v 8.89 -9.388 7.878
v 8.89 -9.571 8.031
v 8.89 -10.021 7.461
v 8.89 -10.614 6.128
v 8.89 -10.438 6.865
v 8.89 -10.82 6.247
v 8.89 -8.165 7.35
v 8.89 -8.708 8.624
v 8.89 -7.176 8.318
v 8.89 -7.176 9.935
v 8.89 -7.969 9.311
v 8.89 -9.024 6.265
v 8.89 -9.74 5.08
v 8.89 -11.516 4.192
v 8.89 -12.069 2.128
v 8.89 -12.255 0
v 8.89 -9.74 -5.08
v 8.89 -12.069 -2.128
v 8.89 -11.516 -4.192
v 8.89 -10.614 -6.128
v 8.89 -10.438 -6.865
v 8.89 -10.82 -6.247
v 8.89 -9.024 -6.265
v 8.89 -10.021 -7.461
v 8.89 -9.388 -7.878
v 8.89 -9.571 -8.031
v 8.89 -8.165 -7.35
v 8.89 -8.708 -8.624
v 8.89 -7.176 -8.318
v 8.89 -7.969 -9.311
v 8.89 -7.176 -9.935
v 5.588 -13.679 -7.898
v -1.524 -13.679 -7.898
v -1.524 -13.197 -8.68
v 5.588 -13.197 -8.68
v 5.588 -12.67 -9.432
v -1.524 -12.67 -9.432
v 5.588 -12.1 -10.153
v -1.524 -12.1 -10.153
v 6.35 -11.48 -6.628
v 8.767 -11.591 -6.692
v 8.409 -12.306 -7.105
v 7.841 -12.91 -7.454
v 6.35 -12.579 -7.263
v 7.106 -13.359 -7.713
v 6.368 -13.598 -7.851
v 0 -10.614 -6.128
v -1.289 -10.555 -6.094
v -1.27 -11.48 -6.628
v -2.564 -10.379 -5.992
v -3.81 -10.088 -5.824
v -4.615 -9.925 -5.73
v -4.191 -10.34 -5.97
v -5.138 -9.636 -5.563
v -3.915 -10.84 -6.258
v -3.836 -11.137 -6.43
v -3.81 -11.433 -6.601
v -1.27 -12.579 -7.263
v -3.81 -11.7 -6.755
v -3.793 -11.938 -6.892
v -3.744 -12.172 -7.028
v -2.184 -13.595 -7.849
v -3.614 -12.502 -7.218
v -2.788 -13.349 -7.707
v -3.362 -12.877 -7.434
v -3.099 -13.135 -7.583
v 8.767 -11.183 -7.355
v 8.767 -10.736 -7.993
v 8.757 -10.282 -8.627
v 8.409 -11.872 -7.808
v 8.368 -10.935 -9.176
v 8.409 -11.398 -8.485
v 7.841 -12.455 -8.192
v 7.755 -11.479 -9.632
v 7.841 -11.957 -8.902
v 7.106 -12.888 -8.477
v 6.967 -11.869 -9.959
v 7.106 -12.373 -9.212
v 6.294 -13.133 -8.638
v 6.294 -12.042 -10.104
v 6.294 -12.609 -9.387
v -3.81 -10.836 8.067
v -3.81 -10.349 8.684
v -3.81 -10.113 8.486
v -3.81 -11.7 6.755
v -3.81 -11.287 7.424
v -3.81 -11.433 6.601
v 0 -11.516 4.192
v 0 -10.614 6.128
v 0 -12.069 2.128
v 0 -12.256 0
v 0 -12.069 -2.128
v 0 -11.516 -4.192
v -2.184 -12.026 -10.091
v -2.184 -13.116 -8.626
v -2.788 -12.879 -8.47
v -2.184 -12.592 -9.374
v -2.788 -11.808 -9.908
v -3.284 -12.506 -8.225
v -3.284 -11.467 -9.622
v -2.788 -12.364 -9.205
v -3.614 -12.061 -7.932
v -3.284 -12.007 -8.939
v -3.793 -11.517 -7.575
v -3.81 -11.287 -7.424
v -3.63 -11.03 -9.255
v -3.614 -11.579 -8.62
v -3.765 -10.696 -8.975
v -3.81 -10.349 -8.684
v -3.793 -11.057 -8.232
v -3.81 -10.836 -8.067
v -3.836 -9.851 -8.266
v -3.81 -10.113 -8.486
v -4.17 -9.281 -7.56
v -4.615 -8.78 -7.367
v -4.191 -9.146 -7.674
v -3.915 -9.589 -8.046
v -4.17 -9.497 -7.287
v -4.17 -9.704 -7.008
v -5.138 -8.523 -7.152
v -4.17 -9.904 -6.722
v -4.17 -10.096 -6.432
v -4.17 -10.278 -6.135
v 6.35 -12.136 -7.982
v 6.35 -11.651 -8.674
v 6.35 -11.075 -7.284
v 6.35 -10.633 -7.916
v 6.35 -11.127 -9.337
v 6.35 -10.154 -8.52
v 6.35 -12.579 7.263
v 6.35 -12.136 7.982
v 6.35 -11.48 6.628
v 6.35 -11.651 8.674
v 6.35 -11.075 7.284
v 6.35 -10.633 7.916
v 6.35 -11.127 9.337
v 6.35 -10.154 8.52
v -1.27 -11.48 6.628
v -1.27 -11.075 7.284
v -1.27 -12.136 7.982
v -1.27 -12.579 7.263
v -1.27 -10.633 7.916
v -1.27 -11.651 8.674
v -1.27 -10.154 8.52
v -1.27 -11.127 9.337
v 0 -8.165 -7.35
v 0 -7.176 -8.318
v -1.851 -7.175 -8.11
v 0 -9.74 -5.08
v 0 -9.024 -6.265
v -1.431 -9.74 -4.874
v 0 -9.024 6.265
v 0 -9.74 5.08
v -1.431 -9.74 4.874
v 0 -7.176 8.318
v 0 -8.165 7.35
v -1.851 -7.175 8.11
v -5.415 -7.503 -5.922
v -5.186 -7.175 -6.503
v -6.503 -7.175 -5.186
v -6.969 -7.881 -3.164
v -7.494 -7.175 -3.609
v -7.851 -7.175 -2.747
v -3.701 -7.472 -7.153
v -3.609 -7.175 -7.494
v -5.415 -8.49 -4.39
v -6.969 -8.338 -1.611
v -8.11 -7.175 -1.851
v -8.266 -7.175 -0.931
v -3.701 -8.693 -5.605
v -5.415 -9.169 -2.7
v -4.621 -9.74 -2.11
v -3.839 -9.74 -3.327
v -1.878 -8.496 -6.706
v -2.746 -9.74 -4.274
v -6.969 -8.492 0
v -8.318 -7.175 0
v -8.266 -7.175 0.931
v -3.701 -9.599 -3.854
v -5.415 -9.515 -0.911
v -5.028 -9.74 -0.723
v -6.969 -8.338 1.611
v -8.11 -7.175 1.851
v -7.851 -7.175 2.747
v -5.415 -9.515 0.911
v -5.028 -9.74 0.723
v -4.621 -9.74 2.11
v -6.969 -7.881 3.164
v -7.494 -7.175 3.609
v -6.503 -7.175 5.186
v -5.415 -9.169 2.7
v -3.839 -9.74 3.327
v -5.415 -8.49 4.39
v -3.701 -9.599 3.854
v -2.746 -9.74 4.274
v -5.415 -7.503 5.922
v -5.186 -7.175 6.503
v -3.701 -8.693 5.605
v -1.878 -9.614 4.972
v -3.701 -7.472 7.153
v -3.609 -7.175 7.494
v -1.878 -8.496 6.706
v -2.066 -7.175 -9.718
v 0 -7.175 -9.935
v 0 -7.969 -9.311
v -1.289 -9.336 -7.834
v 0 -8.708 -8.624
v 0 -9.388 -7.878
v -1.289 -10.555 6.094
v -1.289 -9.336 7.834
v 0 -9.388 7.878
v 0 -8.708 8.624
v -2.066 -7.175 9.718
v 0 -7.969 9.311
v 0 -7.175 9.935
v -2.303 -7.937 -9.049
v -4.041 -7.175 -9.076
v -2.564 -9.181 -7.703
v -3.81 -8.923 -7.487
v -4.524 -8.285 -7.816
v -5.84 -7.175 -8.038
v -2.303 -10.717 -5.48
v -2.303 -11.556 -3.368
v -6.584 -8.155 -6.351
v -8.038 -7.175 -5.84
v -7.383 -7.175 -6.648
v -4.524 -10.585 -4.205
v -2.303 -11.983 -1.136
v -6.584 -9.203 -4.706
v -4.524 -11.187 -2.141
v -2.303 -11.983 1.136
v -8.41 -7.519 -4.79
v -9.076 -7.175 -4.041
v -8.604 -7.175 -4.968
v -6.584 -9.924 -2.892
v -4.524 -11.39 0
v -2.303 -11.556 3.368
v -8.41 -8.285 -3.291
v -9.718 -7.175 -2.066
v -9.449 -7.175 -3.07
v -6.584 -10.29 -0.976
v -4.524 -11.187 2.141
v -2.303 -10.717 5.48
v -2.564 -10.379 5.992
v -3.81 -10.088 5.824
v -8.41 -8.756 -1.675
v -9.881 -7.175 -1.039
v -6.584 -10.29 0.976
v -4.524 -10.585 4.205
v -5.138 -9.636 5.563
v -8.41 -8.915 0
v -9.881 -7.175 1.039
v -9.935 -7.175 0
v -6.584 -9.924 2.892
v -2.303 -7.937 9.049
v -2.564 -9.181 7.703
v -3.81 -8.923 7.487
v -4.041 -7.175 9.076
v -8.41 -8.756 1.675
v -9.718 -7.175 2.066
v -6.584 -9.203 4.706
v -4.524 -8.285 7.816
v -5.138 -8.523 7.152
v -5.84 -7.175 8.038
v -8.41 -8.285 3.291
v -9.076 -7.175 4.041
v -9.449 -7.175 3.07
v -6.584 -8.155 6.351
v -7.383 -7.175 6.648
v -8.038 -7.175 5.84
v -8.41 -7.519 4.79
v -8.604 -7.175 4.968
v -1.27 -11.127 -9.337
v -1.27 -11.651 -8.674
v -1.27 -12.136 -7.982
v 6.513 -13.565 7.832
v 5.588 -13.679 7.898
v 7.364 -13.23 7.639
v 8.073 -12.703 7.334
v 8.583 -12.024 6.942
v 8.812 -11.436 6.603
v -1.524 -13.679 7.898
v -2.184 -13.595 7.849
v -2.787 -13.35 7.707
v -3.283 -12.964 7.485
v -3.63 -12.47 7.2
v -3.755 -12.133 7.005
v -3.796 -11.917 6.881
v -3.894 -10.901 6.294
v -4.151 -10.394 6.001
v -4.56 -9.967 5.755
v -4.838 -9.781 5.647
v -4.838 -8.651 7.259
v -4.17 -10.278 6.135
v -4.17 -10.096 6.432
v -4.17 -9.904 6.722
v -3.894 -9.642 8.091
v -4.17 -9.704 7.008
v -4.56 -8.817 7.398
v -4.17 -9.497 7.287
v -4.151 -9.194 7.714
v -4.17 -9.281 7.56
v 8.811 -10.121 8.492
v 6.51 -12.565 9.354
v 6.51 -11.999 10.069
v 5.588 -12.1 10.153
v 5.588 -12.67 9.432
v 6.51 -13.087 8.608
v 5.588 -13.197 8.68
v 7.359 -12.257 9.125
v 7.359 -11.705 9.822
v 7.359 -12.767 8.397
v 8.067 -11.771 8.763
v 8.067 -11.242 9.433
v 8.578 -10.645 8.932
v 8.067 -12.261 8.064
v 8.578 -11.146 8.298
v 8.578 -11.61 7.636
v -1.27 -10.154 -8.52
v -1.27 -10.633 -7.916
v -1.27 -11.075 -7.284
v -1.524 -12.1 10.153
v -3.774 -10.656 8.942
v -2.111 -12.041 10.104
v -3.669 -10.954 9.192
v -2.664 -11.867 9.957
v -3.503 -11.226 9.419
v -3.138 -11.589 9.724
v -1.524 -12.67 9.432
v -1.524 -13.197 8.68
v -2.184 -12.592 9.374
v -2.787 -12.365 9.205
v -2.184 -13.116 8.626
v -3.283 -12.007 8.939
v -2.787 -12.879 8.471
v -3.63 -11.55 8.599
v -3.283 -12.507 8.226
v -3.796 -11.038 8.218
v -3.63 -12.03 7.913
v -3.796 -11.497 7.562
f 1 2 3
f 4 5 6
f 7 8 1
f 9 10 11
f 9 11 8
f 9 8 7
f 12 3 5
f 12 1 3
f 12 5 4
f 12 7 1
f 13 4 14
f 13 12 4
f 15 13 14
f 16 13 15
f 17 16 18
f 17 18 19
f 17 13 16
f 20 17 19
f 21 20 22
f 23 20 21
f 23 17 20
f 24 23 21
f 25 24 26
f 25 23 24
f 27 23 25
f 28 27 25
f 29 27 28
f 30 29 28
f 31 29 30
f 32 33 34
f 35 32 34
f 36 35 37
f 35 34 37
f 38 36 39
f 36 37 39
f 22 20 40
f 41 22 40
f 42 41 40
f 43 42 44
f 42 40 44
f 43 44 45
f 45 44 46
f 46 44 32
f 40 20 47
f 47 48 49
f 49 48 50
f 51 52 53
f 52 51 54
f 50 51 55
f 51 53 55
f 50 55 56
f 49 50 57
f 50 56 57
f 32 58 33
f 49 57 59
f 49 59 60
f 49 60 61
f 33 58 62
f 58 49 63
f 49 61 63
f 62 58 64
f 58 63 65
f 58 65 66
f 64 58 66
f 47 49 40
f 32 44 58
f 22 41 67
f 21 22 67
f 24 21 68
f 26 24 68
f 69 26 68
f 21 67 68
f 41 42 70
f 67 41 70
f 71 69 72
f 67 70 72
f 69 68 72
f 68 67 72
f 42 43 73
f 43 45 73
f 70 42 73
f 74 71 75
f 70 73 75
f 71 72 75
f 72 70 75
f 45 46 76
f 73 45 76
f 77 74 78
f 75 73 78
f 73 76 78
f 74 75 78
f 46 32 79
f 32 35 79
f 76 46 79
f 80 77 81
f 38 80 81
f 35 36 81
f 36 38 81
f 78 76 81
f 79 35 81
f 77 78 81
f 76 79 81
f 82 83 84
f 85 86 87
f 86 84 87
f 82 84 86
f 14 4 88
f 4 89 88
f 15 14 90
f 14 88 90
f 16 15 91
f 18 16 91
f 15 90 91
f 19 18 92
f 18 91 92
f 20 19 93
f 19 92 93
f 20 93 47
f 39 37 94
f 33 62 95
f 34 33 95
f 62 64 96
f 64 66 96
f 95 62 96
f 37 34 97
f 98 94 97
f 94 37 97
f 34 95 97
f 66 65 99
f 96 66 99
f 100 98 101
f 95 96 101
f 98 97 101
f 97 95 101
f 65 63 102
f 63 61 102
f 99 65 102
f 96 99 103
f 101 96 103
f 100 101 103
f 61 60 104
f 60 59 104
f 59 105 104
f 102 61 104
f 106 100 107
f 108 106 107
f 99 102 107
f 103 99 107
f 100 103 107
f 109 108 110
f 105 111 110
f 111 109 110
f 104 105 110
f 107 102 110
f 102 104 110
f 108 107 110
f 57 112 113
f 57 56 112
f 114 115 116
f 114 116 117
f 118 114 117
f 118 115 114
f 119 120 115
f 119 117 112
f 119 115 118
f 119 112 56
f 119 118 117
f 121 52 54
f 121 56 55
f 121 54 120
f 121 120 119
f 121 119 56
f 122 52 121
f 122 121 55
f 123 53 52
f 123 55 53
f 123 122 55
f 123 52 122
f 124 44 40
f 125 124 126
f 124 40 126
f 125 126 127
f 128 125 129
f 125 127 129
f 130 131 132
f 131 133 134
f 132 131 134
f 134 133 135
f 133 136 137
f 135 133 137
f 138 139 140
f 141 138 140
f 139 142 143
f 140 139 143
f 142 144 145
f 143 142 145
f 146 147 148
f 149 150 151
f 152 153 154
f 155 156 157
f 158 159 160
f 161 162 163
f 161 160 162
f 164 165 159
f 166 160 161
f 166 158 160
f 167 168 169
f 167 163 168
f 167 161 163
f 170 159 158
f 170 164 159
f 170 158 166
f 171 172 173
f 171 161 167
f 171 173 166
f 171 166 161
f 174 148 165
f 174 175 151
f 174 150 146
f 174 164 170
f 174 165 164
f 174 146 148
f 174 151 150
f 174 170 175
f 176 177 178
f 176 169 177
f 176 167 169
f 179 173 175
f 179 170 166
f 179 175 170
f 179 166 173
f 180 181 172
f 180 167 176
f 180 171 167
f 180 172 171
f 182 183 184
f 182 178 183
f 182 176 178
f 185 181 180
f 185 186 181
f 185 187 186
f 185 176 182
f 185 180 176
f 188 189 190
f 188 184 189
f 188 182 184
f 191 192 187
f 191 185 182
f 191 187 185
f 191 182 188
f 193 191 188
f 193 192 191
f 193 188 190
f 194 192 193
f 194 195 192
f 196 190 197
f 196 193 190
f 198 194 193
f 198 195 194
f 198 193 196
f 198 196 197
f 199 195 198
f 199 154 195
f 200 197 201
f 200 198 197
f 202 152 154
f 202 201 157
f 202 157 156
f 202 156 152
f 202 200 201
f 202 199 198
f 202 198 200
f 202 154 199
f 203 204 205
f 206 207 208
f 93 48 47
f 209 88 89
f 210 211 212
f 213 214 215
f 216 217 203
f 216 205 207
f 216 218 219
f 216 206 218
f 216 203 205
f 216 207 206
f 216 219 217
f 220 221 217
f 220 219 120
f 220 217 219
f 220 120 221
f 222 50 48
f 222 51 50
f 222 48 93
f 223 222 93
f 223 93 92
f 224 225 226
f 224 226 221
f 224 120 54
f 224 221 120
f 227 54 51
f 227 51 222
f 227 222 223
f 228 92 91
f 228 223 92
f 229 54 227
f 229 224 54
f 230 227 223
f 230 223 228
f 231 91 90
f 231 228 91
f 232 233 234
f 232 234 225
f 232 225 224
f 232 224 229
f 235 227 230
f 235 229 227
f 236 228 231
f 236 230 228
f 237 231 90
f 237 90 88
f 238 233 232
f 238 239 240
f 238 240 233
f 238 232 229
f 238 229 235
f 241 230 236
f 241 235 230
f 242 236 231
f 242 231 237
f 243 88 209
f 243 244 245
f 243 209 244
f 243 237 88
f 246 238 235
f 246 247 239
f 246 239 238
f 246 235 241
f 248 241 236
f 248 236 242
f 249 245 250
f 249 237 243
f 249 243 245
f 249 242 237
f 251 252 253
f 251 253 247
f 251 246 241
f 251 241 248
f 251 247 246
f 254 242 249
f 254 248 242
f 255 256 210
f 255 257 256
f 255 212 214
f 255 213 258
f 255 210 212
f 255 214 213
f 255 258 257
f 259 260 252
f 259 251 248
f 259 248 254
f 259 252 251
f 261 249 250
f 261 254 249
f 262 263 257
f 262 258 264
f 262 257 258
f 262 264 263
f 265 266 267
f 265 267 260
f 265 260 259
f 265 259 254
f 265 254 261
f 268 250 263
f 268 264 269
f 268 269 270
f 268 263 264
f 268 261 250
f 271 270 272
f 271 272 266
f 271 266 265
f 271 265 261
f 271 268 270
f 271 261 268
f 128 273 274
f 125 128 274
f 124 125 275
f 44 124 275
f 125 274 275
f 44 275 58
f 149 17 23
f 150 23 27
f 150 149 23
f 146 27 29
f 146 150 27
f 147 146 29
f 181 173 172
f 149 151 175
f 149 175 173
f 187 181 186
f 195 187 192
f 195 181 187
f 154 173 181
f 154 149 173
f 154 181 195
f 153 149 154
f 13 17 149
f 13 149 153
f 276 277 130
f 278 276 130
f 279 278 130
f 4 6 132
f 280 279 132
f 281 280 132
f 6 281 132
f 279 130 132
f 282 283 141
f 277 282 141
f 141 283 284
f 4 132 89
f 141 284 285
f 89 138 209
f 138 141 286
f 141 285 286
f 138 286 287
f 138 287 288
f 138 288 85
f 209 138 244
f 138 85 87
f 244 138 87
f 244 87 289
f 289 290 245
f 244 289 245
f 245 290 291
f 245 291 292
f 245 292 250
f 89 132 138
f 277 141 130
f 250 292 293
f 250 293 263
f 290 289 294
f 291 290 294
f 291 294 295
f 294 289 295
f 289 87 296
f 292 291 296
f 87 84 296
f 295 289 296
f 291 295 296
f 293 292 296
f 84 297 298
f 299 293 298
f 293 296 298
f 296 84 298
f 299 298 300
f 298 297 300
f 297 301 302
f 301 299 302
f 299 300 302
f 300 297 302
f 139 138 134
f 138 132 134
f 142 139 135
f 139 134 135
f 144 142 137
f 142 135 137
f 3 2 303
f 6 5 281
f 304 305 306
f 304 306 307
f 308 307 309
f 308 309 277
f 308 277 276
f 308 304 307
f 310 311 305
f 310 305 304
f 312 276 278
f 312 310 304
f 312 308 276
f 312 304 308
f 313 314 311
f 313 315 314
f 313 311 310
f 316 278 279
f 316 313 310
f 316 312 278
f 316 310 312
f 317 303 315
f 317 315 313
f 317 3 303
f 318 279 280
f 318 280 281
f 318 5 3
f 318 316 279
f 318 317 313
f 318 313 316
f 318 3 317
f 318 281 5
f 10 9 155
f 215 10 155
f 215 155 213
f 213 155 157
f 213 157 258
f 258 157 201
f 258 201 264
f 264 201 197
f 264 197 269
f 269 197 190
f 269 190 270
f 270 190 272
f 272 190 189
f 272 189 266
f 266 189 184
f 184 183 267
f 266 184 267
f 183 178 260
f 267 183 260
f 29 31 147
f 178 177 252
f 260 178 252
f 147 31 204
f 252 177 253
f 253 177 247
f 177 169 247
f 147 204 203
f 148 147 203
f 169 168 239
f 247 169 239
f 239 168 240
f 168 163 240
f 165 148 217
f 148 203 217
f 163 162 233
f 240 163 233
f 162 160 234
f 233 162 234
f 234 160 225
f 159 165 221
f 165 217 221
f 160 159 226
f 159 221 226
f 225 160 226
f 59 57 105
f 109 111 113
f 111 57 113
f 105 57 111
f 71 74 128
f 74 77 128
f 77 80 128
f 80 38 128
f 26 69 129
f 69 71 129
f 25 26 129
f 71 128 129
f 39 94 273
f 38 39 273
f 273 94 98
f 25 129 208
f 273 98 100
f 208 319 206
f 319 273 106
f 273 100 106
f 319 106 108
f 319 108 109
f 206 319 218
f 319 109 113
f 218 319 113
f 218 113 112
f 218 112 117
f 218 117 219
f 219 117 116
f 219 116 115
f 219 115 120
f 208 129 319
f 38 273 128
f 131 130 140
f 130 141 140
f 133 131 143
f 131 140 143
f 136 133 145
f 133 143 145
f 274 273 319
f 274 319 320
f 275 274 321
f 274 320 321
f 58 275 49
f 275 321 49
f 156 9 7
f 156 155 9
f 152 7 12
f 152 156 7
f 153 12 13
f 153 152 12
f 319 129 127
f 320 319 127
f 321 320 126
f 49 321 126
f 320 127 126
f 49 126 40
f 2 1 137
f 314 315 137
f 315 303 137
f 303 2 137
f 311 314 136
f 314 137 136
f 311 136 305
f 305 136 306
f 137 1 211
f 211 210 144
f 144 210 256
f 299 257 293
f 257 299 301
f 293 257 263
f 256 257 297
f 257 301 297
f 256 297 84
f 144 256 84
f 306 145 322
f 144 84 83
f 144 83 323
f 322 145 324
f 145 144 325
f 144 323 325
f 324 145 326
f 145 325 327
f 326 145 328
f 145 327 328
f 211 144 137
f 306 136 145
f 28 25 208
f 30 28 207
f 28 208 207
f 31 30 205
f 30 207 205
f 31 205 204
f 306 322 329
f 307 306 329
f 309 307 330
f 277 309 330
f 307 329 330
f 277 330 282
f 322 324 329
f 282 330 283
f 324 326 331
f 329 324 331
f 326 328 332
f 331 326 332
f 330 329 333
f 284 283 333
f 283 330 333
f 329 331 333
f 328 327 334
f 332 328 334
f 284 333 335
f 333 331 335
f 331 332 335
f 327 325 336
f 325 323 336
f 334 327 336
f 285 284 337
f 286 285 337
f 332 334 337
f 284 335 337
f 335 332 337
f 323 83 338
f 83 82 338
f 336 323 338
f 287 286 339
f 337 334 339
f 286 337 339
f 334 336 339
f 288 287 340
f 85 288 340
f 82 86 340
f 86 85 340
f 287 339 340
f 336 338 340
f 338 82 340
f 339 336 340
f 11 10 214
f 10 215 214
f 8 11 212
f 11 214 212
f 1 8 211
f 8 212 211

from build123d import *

# Parameters (mm, degrees)
SKETCH2_R                            = 12.2555
SKETCH2_R_2                          = 10.985499999999998
BOSS_EXTRUDE2_DEPTH                  = 15.239999999999998
CUT_EXTRUDE1_DEPTH                   = 24.079258231147723
CUT_EXTRUDE1_DEPTH_BACK              = 24.079258231147723
SKETCH6_W                            = 19.050000000000004
SKETCH6_H                            = 6.349999999999999
BOSS_EXTRUDE3_DEPTH                  = 11.43
BOSS_EXTRUDE3_DIRECTION_2_REACH      = 32.02
BOSS_EXTRUDE3_DIRECTION_2_END_RADIUS = 12.2555
SKETCH7_R                            = 1.4605000000000004
CUT_EXTRUDE3_DEPTH                   = 31.810720873585545
BOSS_EXTRUDE5_REACH                  = 32.02
LPATTERN1_COUNT                      = 3
LPATTERN1_PITCH                      = 5.334
CUT_EXTRUDE4_DEPTH                   = 35.034282139484006
FILLET5_R                            = 5.08
FILLET6_R                            = 2.54
BOSS_EXTRUDE6_REACH                  = 36.034
CUT_EXTRUDE5_DEPTH                   = 31.81072095045976
CUT_EXTRUDE5_DEPTH_BACK              = 31.81072095045976
CUT_EXTRUDE6_DEPTH                   = 31.81072095045976
CUT_EXTRUDE6_DEPTH_BACK              = 31.81072095045976
BOSS_EXTRUDE7_START                  = -12.7
BOSS_EXTRUDE7_DEPTH                  = 12.7
FILLET7_R                            = 2.286
FILLET8_R                            = 3.3019999999999996


with BuildPart() as part:
    # Sketch2 → Boss-Extrude2 (new body)
    with BuildSketch(Plane(origin=(0, 0, 0), x_dir=(0, 0, -1), z_dir=(1, 0, 0))):
        with Locations(Location((0, 0, 0), (0, 0, 180))):
            Circle(SKETCH2_R)
        with Locations(Location((0, 0, 0), (0, 0, 180))):
            Circle(SKETCH2_R_2, mode=Mode.SUBTRACT)
    extrude(amount=BOSS_EXTRUDE2_DEPTH)

    # Sketch3 → Revolve1 (revolve)
    with BuildSketch(Plane(origin=(0, 0, 0), x_dir=(1, 0, 0), z_dir=(0, 1, 0))):
        with BuildLine():
            Line((-12.2555, -1.5e-15), (-10.985499999999998, -1.35e-15))
            ThreePointArc((-10.985499999999998, 1.35e-15), (-7.767921544724782, 7.767921544724851), (9.58e-14, 10.985499999999998))
            Line((6.22e-15, 10.985499999999998), (6.94e-15, 12.2555))
            ThreePointArc((6.19e-15, 12.2555), (-8.665947156831733, 8.665947156831734), (-12.2555, 1.5e-15))
        make_face()
    revolve(axis=Axis((0, 0, 0), (-1, 0, 1.2e-16)))

    # Sketch4 → Cut-Extrude1 (cut, two sides: drawn at the far end of the back side and taken through both)
    with BuildSketch(Plane(origin=(0, 0, 0), x_dir=(1, 0, 0), z_dir=(0, 1, 0)).offset(-CUT_EXTRUDE1_DEPTH_BACK)):
        Polygon((15.239999999999998, 12.2555), (8.889999999999999, 12.255500000000001), (8.890000000000002, -12.255499999999998), (15.240000000000002, -12.2555), align=None)
    extrude(amount=CUT_EXTRUDE1_DEPTH + CUT_EXTRUDE1_DEPTH_BACK, mode=Mode.SUBTRACT)

    # Sketch6 → Boss-Extrude3 (add)
    with BuildSketch(Plane(origin=(0, 12.255499999999998, 0), x_dir=(1, 0, 0), z_dir=(0, 1, 0))):
        with Locations((-0.6349999999999953, 0)):
            Rectangle(SKETCH6_W, SKETCH6_H)
    extrude(amount=BOSS_EXTRUDE3_DEPTH)

    # Boss-Extrude3 direction 2: up to this cylinder (the profile starts outside it)
    boss_extrude3_direction_2_end = Plane(origin=(-0.6349999999999998, 0, 0), z_dir=(-1, 0, 0)) * Cylinder(BOSS_EXTRUDE3_DIRECTION_2_END_RADIUS, 89.551, mode=Mode.PRIVATE)
    # Sketch6 → Boss-Extrude3 direction 2 (add, up to the surface)
    with BuildSketch(Plane(origin=(0, 12.255499999999998, 0), x_dir=(1, 0, 0), z_dir=(0, 1, 0)), mode=Mode.PRIVATE) as boss_extrude3_direction_2_sk1:
        with Locations((-0.6349999999999953, 0)):
            Rectangle(SKETCH6_W, SKETCH6_H)
    boss_extrude3_direction_2_tool1 = extrude(boss_extrude3_direction_2_sk1.sketch, amount=-BOSS_EXTRUDE3_DIRECTION_2_REACH, mode=Mode.PRIVATE) - boss_extrude3_direction_2_end
    add(boss_extrude3_direction_2_tool1.solids().sort_by_distance((-0.635, 12.2555, 0))[0])
    add(boss_extrude3_direction_2_tool1.solids().sort_by_distance((-0.635, 12.2555, 0))[1])

    # Sketch7 → Cut-Extrude3 (cut, through all)
    with BuildSketch(Plane.XY.offset(3.175)):
        with Locations((4.889500000000005, 19.685)):
            Circle(SKETCH7_R)
    cut_extrude3 = extrude(amount=-CUT_EXTRUDE3_DEPTH, mode=Mode.SUBTRACT)

    # Sketch10 → Boss-Extrude5 (add, up to next)
    with BuildSketch(Plane(origin=(0, 12.255499999999998, 0), x_dir=(1, 0, 0), z_dir=(0, 1, 0)), mode=Mode.PRIVATE) as boss_extrude5_sk1:
        Polygon((8.83e-15, -3.175), (8.05e-15, 3.175), (-10.159999999999993, 3.175), (-10.159999999999997, -3.175), align=None)
    boss_extrude5_tool1 = extrude(boss_extrude5_sk1.sketch, amount=-BOSS_EXTRUDE5_REACH, mode=Mode.PRIVATE) - part.part
    add(boss_extrude5_tool1.solids().sort_by_distance((-5.08, 12.2555, 0))[0])

    # LPattern1: Cut-Extrude3 ×3
    with Locations(*[(-i * LPATTERN1_PITCH, 0, 0) for i in range(1, LPATTERN1_COUNT)]):
        add(cut_extrude3, mode=Mode.SUBTRACT)

    # Sketch8 → Cut-Extrude4 (cut, through all)
    with BuildSketch(Plane(origin=(8.89, 0, -1.26e-15), x_dir=(-1.1e-16, 0, -1), z_dir=(1, 0, -1.1e-16))):
        Polygon((-1.5875, 23.685499999999998), (1.5875, 23.685499999999998), (1.5874999999999988, 16.0655), (-1.5874999999999988, 16.0655), align=None)
    extrude(amount=-CUT_EXTRUDE4_DEPTH, mode=Mode.SUBTRACT)

    # Fillet5
    fillet5_edges = [part.edges().sort_by_distance(p)[0] for p in [
        (8.890000000000006, 23.685499999999998, 2.381249999999999),
        (-10.159999999999997, 23.685499999999998, -2.3812499999999996),
        (8.890000000000006, 23.685499999999998, -2.3812500000000005),
        (-10.159999999999997, 23.685499999999998, 2.3812500000000005),
    ]]
    fillet(fillet5_edges, radius=FILLET5_R)

    # Fillet6
    fillet6_edges = [part.edges().sort_by_distance(p)[0] for p in [
        (4.445000000000007, 11.83708812377436, -3.175),
        (4.445000000000007, 11.83708812377436, 3.175),
        (-5.840399850139422, 10.29594021158298, -3.175),
        (-5.840399850139422, 10.295940211582979, 3.175),
        (-10.159999999999995, 6.853588859130672, 4.2e-15),
    ]]
    fillet(fillet6_edges, radius=FILLET6_R)

    # Sketch11 → Boss-Extrude6 (add, up to next)
    with BuildSketch(Plane(origin=(8.89, 0, -1.26e-15), x_dir=(-1.5e-16, 0, -1), z_dir=(1, 0, -1.5e-16)), mode=Mode.PRIVATE) as boss_extrude6_sk1:
        with BuildLine():
            Line((5.08, -9.740370129004337), (-5.08, -9.740370129004337))
            ThreePointArc((-5.080000000000005, -9.740370129004335), (-3.31e-15, -10.985499999999998), (5.08, -9.740370129004337))
        make_face()
    boss_extrude6_tool1 = extrude(boss_extrude6_sk1.sketch, amount=-BOSS_EXTRUDE6_REACH, mode=Mode.PRIVATE) - part.part
    add(boss_extrude6_tool1.solids().sort_by_distance((8.89, -10.240924, 0))[0])

    # Sketch13 → Cut-Extrude5 (cut, two sides: drawn at the far end of the back side and taken through both)
    with BuildSketch(Plane.XY.offset(3.175).offset(-CUT_EXTRUDE5_DEPTH_BACK)):
        with BuildLine():
            Line((6.350000000000005, 14.795499999999999), (-1.2699999999999942, 14.7955))
            Line((-1.2699999999999942, 14.7955), (-1.2699999999999942, 13.587961408909038))
            ThreePointArc((-1.269999999999727, 13.587961408909017), (-0.6356900108532129, 13.632369326720188), (9.77e-15, 13.647182685448303))
            Line((1.089e-14, 13.647182685448303), (6.350000000000005, 13.647182685448303))
            Line((6.350000000000005, 13.647182685448303), (6.350000000000005, 14.795499999999999))
        make_face()
        with BuildLine():
            ThreePointArc((9.77e-15, 13.647182685448303), (-0.6356900108532129, 13.632369326720188), (-1.269999999999727, 13.587961408909017))
            Line((-1.2699999999999942, 13.587961408909038), (-1.269999999999994, 12.2555))
            Line((-1.269999999999994, 12.2555), (6.350000000000005, 12.2555))
            Line((6.350000000000005, 12.2555), (6.350000000000005, 13.647182685448303))
            Line((6.350000000000005, 13.647182685448303), (1.089e-14, 13.647182685448303))
        make_face()
    extrude(amount=CUT_EXTRUDE5_DEPTH + CUT_EXTRUDE5_DEPTH_BACK, mode=Mode.SUBTRACT)

    # Sketch14 → Cut-Extrude6 (cut, two sides: drawn at the far end of the back side and taken through both)
    with BuildSketch(Plane.XY.offset(3.175).offset(-CUT_EXTRUDE6_DEPTH_BACK)):
        Polygon((8.89, -7.175499999999997), (-12.255499999999998, -7.175499999999999), (-12.255500000000003, 23.685499999999998), (8.889999999999999, 23.685500000000005), align=None)
    extrude(amount=CUT_EXTRUDE6_DEPTH + CUT_EXTRUDE6_DEPTH_BACK, mode=Mode.SUBTRACT)

    # Sketch16 → Boss-Extrude7 (add)
    with BuildSketch(Plane(origin=(8.89, 0, -1.26e-15), x_dir=(-1.4e-16, 0, -1), z_dir=(1, 0, -1.4e-16)).offset(BOSS_EXTRUDE7_START)):
        with BuildLine():
            ThreePointArc((-7.397750000000142, -12.813278861692577), (-8.486350164031906, -12.119764071277773), (-9.510364079117075, -11.334010558166936))
            Line((-9.510364079117169, -11.334010558166854), (-10.153151688803709, -12.100055001285837))
            ThreePointArc((-10.153151688803714, -12.100055001285833), (-9.059926600382918, -12.93891611556679), (-7.89774999999997, -13.679304265477118))
            Line((-7.897749999999964, -13.679304265477123), (-7.397749999999962, -12.813278861692677))
        make_face()
        with BuildLine():
            ThreePointArc((-6.127749999999821, -10.61357433608029), (-7.029466015700107, -10.039117878783834), (-7.877683550513282, -9.38825767264472))
            Line((-7.877683550513363, -9.388257672644649), (-9.510364079117169, -11.334010558166854))
            ThreePointArc((-9.510364079117075, -11.334010558166936), (-8.486350164031906, -12.119764071277773), (-7.397750000000142, -12.813278861692577))
            Line((-7.397749999999962, -12.813278861692677), (-6.1277499999999705, -10.613574336080204))
        make_face()
        with BuildLine():
            ThreePointArc((-5.492750000000139, -9.513722073273868), (-6.301023941534394, -8.998794782536732), (-7.061343286211322, -8.415381229883662))
            Line((-7.06134328621146, -8.415381229883545), (-7.877683550513363, -9.388257672644649))
            ThreePointArc((-7.877683550513282, -9.38825767264472), (-7.029466015700107, -10.039117878783834), (-6.127749999999821, -10.61357433608029))
            Line((-6.1277499999999705, -10.613574336080204), (-5.492749999999971, -9.51372207327396))
        make_face()
        with BuildLine():
            ThreePointArc((7.061343286211319, -8.415381229883664), (6.3010239415344, -8.998794782536729), (5.492750000000143, -9.513722073273867))
            Line((5.492749999999974, -9.513722073273968), (6.127749999999969, -10.613574336080204))
            ThreePointArc((6.127749999999821, -10.613574336080289), (7.029466015700105, -10.039117878783832), (7.877683550513282, -9.388257672644716))
            Line((7.8776835505133604, -9.388257672644645), (7.061343286211458, -8.415381229883542))
        make_face()
        with BuildLine():
            ThreePointArc((7.877683550513282, -9.388257672644716), (7.029466015700105, -10.039117878783832), (6.127749999999821, -10.613574336080289))
            Line((6.127749999999969, -10.613574336080204), (7.397749999999963, -12.813278861692682))
            ThreePointArc((7.397750000000137, -12.81327886169258), (8.486350164031892, -12.119764071277785), (9.510364079117059, -11.33401055816695))
            Line((9.510364079117169, -11.334010558166854), (7.8776835505133604, -9.388257672644645))
        make_face()
        with BuildLine():
            ThreePointArc((9.510364079117059, -11.33401055816695), (8.486350164031892, -12.119764071277785), (7.397750000000137, -12.81327886169258))
            Line((7.397749999999963, -12.813278861692682), (7.897749999999962, -13.679304265477123))
            ThreePointArc((7.897749999999966, -13.679304265477121), (9.059926600382914, -12.938916115566794), (10.15315168880371, -12.100055001285837))
            Line((10.153151688803709, -12.100055001285837), (9.510364079117169, -11.334010558166854))
        make_face()
    extrude(amount=BOSS_EXTRUDE7_DEPTH)

    # Sketch17 → Cut-Revolve1 (revolve, cut)
    with BuildSketch(Plane(origin=(0, 0, 0), x_dir=(1, -7e-17, -8e-17), z_dir=(0, 0.6427876096865381, 0.7660444431189791))):
        Polygon((-1.269999999999997, -13.255499999999996), (6.350000000000001, -13.255499999999996), (6.350000000000001, -14.525499999999997), (-1.269999999999997, -14.525499999999996), align=None)
    revolve(axis=Axis((8.890000000000002, 0, 0), (-1, 0, 0)), mode=Mode.SUBTRACT)

    # Fillet7
    fillet7_edges = [part.edges().sort_by_distance(p)[0] for p in [
        (-3.809999999999998, -9.541668537674667, 6.681148237178193),
        (-3.8099999999999974, -12.938916115566784, 9.059926600382923),
        (-3.8099999999999996, -9.541668537674669, -6.681148237178193),
        (-3.81, -12.938916115566787, -9.059926600382923),
    ]]
    fillet(fillet7_edges, radius=FILLET7_R)

    # Fillet8
    fillet8_edges = [part.edges().sort_by_distance(p)[0] for p in [
        (8.890000000000002, -12.938916115566784, 9.059926600382921),
        (8.889999999999999, -12.938916115566787, -9.059926600382925),
    ]]
    fillet(fillet8_edges, radius=FILLET8_R)


solid = part.part
